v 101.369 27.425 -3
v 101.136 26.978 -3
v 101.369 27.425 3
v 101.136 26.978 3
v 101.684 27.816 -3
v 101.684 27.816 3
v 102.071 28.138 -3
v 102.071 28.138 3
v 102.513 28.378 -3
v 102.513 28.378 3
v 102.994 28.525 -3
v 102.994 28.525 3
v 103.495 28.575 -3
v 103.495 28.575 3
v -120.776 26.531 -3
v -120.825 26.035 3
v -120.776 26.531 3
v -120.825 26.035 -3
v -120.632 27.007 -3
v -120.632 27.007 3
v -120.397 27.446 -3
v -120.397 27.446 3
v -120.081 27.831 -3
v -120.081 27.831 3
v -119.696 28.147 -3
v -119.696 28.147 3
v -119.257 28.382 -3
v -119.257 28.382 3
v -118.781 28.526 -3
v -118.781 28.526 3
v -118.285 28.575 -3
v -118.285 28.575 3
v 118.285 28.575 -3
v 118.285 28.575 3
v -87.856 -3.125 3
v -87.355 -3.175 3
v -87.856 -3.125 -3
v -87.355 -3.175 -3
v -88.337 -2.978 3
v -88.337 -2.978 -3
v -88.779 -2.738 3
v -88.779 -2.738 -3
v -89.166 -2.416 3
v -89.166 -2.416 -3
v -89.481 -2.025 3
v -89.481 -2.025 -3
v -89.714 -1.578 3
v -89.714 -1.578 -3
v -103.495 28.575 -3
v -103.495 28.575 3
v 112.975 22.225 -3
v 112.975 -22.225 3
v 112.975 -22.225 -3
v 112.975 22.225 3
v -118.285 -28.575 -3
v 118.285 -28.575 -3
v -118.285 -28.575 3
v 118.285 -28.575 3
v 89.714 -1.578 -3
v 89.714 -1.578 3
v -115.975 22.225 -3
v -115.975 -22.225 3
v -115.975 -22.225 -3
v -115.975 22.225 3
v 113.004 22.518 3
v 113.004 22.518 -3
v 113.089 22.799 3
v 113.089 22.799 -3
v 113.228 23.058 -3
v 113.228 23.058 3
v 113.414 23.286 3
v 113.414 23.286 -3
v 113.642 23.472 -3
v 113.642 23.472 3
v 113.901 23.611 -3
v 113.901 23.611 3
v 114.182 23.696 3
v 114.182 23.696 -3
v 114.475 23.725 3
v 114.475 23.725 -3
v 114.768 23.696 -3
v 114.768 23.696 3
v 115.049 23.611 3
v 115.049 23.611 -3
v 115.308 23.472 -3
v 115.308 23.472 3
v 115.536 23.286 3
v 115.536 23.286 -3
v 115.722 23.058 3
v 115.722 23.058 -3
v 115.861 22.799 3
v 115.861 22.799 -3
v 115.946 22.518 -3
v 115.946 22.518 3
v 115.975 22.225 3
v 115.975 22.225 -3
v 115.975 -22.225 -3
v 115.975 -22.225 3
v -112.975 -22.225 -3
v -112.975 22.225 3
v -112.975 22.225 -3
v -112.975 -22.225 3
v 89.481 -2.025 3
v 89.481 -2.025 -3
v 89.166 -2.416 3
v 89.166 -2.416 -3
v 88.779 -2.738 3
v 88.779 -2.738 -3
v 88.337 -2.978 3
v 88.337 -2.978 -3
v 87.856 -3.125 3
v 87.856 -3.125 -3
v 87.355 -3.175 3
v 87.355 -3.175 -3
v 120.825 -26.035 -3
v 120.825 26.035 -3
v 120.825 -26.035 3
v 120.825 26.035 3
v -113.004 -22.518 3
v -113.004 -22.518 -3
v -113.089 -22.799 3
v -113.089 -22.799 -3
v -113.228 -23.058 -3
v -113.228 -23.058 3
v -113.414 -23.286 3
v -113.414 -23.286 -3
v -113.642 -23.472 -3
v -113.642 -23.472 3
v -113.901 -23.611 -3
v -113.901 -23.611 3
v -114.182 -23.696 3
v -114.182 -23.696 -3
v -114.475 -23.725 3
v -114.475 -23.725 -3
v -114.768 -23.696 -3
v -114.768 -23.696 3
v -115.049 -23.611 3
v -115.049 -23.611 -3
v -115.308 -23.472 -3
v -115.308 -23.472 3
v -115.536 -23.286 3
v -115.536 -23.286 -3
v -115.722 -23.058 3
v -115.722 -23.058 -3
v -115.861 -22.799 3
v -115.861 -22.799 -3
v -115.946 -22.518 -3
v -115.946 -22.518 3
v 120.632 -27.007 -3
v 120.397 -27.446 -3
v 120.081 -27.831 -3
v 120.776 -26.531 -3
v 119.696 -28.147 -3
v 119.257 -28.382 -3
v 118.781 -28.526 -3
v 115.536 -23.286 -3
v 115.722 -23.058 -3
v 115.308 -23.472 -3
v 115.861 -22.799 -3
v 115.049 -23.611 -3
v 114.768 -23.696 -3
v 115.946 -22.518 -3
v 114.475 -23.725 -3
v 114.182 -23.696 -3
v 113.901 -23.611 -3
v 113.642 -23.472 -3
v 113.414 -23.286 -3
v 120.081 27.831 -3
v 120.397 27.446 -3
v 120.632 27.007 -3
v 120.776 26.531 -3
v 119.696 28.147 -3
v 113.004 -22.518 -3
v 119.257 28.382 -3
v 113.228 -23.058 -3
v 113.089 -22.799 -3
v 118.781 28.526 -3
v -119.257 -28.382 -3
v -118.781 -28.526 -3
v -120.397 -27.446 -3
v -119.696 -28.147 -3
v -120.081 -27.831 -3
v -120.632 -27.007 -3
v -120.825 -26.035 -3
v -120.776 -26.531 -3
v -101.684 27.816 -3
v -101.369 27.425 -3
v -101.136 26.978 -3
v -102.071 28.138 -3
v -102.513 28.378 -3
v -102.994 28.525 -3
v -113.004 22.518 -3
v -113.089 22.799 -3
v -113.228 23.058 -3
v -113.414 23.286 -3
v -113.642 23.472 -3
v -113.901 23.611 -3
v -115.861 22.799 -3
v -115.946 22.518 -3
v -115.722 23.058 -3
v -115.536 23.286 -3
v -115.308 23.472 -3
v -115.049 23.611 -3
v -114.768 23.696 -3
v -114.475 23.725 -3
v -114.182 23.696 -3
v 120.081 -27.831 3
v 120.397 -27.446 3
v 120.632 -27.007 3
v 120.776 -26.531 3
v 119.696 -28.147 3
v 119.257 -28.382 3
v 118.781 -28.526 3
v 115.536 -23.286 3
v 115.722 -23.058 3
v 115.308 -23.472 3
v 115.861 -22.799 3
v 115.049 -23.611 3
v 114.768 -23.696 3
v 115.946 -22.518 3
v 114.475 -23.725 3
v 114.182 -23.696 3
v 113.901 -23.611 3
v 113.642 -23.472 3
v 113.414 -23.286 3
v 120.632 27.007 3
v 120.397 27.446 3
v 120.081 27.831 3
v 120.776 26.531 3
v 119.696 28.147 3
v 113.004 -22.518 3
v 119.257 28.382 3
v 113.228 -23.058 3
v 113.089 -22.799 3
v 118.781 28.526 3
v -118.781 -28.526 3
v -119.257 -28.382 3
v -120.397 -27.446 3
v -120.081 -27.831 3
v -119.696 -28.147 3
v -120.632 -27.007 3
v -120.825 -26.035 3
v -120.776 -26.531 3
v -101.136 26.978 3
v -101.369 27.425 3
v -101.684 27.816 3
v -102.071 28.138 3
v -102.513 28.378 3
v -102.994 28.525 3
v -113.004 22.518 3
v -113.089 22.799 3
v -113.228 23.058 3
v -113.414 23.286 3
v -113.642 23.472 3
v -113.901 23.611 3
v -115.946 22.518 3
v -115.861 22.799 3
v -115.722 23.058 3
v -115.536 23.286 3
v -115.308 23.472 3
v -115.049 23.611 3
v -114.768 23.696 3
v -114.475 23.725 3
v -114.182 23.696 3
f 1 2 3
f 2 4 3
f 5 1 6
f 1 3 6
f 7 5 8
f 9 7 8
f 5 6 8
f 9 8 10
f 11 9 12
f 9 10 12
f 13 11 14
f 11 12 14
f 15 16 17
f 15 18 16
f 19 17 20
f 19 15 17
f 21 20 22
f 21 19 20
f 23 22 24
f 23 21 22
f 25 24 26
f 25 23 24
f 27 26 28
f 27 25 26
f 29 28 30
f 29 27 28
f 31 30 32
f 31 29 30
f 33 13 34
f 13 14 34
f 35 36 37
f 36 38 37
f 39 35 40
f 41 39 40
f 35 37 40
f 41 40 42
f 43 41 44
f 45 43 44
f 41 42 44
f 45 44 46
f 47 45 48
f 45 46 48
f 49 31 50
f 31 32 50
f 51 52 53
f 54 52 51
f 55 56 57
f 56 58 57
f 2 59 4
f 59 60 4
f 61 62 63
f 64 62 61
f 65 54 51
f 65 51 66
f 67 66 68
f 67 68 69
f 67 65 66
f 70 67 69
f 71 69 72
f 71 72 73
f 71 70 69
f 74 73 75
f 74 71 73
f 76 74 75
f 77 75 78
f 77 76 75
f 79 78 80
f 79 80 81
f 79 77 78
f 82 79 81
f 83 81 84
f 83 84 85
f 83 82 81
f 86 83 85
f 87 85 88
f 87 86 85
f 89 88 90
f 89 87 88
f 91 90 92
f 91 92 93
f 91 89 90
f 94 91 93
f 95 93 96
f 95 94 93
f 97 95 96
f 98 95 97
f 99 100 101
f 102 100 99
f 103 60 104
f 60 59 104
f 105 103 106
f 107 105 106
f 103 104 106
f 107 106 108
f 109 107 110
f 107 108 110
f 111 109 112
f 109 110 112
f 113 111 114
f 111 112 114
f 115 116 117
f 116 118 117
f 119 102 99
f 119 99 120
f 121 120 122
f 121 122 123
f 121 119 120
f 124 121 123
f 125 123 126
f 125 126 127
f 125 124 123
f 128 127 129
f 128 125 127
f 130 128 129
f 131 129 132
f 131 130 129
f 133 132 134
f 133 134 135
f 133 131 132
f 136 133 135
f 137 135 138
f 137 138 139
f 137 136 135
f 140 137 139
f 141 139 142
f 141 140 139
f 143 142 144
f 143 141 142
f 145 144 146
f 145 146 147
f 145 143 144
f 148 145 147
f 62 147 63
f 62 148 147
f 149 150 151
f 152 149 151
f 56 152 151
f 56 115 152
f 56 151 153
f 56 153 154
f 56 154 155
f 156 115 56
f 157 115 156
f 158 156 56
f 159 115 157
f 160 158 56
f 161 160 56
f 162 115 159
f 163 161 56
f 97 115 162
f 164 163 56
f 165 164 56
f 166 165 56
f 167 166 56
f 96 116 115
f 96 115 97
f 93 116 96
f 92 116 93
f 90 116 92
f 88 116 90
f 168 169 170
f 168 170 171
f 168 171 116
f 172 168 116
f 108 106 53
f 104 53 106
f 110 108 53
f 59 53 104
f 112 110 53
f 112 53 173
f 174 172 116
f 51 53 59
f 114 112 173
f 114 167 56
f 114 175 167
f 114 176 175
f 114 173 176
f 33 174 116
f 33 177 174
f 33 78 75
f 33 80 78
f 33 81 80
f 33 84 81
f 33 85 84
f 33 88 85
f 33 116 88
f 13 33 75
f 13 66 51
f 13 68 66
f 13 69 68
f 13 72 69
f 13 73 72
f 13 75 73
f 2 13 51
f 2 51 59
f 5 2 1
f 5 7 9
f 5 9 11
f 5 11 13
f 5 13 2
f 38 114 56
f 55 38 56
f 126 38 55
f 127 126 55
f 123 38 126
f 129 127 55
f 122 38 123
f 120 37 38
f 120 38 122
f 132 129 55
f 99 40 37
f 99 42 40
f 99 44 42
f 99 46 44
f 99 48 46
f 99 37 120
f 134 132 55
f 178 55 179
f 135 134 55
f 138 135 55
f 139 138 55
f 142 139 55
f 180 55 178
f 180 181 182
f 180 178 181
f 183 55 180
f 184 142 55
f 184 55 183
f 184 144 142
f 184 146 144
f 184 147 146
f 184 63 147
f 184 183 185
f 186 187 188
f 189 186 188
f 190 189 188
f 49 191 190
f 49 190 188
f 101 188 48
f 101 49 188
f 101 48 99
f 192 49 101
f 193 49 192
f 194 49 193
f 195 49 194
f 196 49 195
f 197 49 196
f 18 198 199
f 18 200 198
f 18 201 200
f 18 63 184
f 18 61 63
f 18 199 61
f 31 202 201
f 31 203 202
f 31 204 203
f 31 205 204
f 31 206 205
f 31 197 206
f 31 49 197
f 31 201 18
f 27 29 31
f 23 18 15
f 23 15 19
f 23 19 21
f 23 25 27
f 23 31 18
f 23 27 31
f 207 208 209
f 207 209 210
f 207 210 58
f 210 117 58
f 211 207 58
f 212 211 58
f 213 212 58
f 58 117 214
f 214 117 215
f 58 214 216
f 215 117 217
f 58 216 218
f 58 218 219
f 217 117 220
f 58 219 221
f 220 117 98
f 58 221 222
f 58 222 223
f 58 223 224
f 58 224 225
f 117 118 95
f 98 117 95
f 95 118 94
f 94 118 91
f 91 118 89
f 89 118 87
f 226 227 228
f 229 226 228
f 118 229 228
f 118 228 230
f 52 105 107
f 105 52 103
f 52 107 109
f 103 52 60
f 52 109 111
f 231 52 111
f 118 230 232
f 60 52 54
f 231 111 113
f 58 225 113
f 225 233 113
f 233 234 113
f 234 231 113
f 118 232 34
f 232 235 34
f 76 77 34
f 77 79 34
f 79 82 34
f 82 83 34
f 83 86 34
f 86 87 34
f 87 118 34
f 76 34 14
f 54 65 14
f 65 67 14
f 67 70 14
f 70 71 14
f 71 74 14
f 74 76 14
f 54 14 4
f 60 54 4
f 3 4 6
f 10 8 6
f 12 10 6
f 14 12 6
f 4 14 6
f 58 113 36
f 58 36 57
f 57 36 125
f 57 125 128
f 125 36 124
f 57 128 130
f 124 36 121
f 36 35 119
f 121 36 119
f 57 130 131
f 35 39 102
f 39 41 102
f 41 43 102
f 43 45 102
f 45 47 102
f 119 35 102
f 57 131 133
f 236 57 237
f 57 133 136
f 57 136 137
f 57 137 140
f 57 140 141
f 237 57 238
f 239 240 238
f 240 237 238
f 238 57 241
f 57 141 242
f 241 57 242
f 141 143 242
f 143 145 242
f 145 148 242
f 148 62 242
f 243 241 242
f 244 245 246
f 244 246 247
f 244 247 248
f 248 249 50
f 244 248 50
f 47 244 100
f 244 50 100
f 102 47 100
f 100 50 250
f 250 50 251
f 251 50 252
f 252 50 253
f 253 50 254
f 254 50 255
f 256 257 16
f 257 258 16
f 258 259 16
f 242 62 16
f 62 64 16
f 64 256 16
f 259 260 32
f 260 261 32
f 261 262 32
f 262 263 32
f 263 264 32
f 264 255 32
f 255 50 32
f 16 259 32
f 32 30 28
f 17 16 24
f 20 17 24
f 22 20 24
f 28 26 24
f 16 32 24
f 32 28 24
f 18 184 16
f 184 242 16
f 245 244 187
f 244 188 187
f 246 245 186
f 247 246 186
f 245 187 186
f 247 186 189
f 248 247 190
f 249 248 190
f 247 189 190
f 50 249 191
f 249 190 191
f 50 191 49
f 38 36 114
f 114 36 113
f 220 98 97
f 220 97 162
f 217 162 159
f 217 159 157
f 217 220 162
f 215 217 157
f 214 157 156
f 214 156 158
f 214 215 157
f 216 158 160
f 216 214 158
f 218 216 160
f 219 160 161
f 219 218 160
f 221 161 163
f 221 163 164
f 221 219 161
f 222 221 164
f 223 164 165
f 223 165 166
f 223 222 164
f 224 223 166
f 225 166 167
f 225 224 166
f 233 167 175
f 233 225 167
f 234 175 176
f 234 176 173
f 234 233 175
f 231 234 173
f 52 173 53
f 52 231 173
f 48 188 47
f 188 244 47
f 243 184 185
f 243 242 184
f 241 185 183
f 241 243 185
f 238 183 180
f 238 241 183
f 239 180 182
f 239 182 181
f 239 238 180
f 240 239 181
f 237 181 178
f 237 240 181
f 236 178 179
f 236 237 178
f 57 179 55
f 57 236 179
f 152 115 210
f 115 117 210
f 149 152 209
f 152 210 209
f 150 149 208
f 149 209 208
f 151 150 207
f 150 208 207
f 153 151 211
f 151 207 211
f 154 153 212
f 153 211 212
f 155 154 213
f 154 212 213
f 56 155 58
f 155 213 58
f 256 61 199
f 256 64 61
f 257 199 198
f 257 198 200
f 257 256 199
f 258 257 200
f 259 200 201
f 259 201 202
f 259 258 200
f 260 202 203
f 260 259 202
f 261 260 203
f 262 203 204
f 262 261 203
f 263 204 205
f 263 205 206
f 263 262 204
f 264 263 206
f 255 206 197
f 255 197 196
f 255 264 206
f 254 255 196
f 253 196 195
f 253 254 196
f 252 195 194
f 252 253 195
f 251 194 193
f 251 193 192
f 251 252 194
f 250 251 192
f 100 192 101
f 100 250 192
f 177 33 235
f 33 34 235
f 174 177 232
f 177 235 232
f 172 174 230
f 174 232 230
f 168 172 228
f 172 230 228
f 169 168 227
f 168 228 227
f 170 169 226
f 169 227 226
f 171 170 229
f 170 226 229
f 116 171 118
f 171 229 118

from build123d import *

# Parameters (mm, degrees)
BOSS_EXTRUDE1_DEPTH = 3
FILLET1_R           = 2.54


with BuildPart() as part:
    # Sketch1 → Boss-Extrude1 (new, symmetric)
    with BuildSketch(Plane.XY):
        Polygon((-120.825, -28.575), (-120.825, 28.575), (-101.775, 28.575), (-89.075, -3.175), (89.075, -3.175), (101.775, 28.575), (120.825, 28.575), (120.825, -28.575), align=None)
        with BuildLine():
            Line((-112.975, 22.225), (-112.975, -22.225))
            ThreePointArc((-112.975, -22.225), (-114.475, -23.725), (-115.975, -22.225))
            Line((-115.975, -22.225), (-115.975, 22.225))
            ThreePointArc((-115.975, 22.225), (-114.475, 23.725), (-112.975, 22.225))
        make_face(mode=Mode.SUBTRACT)
        with BuildLine():
            Line((115.975, 22.225), (115.975, -22.225))
            ThreePointArc((115.975, -22.225), (114.475, -23.725), (112.975, -22.225))
            Line((112.975, -22.225), (112.975, 22.225))
            ThreePointArc((112.975, 22.225), (114.475, 23.725), (115.975, 22.225))
        make_face(mode=Mode.SUBTRACT)
    extrude(amount=BOSS_EXTRUDE1_DEPTH, both=True)

    # Fillet1
    fillet1_edges = [part.edges().sort_by_distance(p)[0] for p in [
        (120.825, 28.575, 0),
        (120.825, -28.575, 0),
        (-120.825, -28.575, 0),
        (-120.825, 28.575, 0),
        (-101.775, 28.575, 0),
        (-89.075, -3.175, 0),
        (89.075, -3.175, 0),
        (101.775, 28.575, 0),
    ]]
    fillet(fillet1_edges, radius=FILLET1_R)


solid = part.part
